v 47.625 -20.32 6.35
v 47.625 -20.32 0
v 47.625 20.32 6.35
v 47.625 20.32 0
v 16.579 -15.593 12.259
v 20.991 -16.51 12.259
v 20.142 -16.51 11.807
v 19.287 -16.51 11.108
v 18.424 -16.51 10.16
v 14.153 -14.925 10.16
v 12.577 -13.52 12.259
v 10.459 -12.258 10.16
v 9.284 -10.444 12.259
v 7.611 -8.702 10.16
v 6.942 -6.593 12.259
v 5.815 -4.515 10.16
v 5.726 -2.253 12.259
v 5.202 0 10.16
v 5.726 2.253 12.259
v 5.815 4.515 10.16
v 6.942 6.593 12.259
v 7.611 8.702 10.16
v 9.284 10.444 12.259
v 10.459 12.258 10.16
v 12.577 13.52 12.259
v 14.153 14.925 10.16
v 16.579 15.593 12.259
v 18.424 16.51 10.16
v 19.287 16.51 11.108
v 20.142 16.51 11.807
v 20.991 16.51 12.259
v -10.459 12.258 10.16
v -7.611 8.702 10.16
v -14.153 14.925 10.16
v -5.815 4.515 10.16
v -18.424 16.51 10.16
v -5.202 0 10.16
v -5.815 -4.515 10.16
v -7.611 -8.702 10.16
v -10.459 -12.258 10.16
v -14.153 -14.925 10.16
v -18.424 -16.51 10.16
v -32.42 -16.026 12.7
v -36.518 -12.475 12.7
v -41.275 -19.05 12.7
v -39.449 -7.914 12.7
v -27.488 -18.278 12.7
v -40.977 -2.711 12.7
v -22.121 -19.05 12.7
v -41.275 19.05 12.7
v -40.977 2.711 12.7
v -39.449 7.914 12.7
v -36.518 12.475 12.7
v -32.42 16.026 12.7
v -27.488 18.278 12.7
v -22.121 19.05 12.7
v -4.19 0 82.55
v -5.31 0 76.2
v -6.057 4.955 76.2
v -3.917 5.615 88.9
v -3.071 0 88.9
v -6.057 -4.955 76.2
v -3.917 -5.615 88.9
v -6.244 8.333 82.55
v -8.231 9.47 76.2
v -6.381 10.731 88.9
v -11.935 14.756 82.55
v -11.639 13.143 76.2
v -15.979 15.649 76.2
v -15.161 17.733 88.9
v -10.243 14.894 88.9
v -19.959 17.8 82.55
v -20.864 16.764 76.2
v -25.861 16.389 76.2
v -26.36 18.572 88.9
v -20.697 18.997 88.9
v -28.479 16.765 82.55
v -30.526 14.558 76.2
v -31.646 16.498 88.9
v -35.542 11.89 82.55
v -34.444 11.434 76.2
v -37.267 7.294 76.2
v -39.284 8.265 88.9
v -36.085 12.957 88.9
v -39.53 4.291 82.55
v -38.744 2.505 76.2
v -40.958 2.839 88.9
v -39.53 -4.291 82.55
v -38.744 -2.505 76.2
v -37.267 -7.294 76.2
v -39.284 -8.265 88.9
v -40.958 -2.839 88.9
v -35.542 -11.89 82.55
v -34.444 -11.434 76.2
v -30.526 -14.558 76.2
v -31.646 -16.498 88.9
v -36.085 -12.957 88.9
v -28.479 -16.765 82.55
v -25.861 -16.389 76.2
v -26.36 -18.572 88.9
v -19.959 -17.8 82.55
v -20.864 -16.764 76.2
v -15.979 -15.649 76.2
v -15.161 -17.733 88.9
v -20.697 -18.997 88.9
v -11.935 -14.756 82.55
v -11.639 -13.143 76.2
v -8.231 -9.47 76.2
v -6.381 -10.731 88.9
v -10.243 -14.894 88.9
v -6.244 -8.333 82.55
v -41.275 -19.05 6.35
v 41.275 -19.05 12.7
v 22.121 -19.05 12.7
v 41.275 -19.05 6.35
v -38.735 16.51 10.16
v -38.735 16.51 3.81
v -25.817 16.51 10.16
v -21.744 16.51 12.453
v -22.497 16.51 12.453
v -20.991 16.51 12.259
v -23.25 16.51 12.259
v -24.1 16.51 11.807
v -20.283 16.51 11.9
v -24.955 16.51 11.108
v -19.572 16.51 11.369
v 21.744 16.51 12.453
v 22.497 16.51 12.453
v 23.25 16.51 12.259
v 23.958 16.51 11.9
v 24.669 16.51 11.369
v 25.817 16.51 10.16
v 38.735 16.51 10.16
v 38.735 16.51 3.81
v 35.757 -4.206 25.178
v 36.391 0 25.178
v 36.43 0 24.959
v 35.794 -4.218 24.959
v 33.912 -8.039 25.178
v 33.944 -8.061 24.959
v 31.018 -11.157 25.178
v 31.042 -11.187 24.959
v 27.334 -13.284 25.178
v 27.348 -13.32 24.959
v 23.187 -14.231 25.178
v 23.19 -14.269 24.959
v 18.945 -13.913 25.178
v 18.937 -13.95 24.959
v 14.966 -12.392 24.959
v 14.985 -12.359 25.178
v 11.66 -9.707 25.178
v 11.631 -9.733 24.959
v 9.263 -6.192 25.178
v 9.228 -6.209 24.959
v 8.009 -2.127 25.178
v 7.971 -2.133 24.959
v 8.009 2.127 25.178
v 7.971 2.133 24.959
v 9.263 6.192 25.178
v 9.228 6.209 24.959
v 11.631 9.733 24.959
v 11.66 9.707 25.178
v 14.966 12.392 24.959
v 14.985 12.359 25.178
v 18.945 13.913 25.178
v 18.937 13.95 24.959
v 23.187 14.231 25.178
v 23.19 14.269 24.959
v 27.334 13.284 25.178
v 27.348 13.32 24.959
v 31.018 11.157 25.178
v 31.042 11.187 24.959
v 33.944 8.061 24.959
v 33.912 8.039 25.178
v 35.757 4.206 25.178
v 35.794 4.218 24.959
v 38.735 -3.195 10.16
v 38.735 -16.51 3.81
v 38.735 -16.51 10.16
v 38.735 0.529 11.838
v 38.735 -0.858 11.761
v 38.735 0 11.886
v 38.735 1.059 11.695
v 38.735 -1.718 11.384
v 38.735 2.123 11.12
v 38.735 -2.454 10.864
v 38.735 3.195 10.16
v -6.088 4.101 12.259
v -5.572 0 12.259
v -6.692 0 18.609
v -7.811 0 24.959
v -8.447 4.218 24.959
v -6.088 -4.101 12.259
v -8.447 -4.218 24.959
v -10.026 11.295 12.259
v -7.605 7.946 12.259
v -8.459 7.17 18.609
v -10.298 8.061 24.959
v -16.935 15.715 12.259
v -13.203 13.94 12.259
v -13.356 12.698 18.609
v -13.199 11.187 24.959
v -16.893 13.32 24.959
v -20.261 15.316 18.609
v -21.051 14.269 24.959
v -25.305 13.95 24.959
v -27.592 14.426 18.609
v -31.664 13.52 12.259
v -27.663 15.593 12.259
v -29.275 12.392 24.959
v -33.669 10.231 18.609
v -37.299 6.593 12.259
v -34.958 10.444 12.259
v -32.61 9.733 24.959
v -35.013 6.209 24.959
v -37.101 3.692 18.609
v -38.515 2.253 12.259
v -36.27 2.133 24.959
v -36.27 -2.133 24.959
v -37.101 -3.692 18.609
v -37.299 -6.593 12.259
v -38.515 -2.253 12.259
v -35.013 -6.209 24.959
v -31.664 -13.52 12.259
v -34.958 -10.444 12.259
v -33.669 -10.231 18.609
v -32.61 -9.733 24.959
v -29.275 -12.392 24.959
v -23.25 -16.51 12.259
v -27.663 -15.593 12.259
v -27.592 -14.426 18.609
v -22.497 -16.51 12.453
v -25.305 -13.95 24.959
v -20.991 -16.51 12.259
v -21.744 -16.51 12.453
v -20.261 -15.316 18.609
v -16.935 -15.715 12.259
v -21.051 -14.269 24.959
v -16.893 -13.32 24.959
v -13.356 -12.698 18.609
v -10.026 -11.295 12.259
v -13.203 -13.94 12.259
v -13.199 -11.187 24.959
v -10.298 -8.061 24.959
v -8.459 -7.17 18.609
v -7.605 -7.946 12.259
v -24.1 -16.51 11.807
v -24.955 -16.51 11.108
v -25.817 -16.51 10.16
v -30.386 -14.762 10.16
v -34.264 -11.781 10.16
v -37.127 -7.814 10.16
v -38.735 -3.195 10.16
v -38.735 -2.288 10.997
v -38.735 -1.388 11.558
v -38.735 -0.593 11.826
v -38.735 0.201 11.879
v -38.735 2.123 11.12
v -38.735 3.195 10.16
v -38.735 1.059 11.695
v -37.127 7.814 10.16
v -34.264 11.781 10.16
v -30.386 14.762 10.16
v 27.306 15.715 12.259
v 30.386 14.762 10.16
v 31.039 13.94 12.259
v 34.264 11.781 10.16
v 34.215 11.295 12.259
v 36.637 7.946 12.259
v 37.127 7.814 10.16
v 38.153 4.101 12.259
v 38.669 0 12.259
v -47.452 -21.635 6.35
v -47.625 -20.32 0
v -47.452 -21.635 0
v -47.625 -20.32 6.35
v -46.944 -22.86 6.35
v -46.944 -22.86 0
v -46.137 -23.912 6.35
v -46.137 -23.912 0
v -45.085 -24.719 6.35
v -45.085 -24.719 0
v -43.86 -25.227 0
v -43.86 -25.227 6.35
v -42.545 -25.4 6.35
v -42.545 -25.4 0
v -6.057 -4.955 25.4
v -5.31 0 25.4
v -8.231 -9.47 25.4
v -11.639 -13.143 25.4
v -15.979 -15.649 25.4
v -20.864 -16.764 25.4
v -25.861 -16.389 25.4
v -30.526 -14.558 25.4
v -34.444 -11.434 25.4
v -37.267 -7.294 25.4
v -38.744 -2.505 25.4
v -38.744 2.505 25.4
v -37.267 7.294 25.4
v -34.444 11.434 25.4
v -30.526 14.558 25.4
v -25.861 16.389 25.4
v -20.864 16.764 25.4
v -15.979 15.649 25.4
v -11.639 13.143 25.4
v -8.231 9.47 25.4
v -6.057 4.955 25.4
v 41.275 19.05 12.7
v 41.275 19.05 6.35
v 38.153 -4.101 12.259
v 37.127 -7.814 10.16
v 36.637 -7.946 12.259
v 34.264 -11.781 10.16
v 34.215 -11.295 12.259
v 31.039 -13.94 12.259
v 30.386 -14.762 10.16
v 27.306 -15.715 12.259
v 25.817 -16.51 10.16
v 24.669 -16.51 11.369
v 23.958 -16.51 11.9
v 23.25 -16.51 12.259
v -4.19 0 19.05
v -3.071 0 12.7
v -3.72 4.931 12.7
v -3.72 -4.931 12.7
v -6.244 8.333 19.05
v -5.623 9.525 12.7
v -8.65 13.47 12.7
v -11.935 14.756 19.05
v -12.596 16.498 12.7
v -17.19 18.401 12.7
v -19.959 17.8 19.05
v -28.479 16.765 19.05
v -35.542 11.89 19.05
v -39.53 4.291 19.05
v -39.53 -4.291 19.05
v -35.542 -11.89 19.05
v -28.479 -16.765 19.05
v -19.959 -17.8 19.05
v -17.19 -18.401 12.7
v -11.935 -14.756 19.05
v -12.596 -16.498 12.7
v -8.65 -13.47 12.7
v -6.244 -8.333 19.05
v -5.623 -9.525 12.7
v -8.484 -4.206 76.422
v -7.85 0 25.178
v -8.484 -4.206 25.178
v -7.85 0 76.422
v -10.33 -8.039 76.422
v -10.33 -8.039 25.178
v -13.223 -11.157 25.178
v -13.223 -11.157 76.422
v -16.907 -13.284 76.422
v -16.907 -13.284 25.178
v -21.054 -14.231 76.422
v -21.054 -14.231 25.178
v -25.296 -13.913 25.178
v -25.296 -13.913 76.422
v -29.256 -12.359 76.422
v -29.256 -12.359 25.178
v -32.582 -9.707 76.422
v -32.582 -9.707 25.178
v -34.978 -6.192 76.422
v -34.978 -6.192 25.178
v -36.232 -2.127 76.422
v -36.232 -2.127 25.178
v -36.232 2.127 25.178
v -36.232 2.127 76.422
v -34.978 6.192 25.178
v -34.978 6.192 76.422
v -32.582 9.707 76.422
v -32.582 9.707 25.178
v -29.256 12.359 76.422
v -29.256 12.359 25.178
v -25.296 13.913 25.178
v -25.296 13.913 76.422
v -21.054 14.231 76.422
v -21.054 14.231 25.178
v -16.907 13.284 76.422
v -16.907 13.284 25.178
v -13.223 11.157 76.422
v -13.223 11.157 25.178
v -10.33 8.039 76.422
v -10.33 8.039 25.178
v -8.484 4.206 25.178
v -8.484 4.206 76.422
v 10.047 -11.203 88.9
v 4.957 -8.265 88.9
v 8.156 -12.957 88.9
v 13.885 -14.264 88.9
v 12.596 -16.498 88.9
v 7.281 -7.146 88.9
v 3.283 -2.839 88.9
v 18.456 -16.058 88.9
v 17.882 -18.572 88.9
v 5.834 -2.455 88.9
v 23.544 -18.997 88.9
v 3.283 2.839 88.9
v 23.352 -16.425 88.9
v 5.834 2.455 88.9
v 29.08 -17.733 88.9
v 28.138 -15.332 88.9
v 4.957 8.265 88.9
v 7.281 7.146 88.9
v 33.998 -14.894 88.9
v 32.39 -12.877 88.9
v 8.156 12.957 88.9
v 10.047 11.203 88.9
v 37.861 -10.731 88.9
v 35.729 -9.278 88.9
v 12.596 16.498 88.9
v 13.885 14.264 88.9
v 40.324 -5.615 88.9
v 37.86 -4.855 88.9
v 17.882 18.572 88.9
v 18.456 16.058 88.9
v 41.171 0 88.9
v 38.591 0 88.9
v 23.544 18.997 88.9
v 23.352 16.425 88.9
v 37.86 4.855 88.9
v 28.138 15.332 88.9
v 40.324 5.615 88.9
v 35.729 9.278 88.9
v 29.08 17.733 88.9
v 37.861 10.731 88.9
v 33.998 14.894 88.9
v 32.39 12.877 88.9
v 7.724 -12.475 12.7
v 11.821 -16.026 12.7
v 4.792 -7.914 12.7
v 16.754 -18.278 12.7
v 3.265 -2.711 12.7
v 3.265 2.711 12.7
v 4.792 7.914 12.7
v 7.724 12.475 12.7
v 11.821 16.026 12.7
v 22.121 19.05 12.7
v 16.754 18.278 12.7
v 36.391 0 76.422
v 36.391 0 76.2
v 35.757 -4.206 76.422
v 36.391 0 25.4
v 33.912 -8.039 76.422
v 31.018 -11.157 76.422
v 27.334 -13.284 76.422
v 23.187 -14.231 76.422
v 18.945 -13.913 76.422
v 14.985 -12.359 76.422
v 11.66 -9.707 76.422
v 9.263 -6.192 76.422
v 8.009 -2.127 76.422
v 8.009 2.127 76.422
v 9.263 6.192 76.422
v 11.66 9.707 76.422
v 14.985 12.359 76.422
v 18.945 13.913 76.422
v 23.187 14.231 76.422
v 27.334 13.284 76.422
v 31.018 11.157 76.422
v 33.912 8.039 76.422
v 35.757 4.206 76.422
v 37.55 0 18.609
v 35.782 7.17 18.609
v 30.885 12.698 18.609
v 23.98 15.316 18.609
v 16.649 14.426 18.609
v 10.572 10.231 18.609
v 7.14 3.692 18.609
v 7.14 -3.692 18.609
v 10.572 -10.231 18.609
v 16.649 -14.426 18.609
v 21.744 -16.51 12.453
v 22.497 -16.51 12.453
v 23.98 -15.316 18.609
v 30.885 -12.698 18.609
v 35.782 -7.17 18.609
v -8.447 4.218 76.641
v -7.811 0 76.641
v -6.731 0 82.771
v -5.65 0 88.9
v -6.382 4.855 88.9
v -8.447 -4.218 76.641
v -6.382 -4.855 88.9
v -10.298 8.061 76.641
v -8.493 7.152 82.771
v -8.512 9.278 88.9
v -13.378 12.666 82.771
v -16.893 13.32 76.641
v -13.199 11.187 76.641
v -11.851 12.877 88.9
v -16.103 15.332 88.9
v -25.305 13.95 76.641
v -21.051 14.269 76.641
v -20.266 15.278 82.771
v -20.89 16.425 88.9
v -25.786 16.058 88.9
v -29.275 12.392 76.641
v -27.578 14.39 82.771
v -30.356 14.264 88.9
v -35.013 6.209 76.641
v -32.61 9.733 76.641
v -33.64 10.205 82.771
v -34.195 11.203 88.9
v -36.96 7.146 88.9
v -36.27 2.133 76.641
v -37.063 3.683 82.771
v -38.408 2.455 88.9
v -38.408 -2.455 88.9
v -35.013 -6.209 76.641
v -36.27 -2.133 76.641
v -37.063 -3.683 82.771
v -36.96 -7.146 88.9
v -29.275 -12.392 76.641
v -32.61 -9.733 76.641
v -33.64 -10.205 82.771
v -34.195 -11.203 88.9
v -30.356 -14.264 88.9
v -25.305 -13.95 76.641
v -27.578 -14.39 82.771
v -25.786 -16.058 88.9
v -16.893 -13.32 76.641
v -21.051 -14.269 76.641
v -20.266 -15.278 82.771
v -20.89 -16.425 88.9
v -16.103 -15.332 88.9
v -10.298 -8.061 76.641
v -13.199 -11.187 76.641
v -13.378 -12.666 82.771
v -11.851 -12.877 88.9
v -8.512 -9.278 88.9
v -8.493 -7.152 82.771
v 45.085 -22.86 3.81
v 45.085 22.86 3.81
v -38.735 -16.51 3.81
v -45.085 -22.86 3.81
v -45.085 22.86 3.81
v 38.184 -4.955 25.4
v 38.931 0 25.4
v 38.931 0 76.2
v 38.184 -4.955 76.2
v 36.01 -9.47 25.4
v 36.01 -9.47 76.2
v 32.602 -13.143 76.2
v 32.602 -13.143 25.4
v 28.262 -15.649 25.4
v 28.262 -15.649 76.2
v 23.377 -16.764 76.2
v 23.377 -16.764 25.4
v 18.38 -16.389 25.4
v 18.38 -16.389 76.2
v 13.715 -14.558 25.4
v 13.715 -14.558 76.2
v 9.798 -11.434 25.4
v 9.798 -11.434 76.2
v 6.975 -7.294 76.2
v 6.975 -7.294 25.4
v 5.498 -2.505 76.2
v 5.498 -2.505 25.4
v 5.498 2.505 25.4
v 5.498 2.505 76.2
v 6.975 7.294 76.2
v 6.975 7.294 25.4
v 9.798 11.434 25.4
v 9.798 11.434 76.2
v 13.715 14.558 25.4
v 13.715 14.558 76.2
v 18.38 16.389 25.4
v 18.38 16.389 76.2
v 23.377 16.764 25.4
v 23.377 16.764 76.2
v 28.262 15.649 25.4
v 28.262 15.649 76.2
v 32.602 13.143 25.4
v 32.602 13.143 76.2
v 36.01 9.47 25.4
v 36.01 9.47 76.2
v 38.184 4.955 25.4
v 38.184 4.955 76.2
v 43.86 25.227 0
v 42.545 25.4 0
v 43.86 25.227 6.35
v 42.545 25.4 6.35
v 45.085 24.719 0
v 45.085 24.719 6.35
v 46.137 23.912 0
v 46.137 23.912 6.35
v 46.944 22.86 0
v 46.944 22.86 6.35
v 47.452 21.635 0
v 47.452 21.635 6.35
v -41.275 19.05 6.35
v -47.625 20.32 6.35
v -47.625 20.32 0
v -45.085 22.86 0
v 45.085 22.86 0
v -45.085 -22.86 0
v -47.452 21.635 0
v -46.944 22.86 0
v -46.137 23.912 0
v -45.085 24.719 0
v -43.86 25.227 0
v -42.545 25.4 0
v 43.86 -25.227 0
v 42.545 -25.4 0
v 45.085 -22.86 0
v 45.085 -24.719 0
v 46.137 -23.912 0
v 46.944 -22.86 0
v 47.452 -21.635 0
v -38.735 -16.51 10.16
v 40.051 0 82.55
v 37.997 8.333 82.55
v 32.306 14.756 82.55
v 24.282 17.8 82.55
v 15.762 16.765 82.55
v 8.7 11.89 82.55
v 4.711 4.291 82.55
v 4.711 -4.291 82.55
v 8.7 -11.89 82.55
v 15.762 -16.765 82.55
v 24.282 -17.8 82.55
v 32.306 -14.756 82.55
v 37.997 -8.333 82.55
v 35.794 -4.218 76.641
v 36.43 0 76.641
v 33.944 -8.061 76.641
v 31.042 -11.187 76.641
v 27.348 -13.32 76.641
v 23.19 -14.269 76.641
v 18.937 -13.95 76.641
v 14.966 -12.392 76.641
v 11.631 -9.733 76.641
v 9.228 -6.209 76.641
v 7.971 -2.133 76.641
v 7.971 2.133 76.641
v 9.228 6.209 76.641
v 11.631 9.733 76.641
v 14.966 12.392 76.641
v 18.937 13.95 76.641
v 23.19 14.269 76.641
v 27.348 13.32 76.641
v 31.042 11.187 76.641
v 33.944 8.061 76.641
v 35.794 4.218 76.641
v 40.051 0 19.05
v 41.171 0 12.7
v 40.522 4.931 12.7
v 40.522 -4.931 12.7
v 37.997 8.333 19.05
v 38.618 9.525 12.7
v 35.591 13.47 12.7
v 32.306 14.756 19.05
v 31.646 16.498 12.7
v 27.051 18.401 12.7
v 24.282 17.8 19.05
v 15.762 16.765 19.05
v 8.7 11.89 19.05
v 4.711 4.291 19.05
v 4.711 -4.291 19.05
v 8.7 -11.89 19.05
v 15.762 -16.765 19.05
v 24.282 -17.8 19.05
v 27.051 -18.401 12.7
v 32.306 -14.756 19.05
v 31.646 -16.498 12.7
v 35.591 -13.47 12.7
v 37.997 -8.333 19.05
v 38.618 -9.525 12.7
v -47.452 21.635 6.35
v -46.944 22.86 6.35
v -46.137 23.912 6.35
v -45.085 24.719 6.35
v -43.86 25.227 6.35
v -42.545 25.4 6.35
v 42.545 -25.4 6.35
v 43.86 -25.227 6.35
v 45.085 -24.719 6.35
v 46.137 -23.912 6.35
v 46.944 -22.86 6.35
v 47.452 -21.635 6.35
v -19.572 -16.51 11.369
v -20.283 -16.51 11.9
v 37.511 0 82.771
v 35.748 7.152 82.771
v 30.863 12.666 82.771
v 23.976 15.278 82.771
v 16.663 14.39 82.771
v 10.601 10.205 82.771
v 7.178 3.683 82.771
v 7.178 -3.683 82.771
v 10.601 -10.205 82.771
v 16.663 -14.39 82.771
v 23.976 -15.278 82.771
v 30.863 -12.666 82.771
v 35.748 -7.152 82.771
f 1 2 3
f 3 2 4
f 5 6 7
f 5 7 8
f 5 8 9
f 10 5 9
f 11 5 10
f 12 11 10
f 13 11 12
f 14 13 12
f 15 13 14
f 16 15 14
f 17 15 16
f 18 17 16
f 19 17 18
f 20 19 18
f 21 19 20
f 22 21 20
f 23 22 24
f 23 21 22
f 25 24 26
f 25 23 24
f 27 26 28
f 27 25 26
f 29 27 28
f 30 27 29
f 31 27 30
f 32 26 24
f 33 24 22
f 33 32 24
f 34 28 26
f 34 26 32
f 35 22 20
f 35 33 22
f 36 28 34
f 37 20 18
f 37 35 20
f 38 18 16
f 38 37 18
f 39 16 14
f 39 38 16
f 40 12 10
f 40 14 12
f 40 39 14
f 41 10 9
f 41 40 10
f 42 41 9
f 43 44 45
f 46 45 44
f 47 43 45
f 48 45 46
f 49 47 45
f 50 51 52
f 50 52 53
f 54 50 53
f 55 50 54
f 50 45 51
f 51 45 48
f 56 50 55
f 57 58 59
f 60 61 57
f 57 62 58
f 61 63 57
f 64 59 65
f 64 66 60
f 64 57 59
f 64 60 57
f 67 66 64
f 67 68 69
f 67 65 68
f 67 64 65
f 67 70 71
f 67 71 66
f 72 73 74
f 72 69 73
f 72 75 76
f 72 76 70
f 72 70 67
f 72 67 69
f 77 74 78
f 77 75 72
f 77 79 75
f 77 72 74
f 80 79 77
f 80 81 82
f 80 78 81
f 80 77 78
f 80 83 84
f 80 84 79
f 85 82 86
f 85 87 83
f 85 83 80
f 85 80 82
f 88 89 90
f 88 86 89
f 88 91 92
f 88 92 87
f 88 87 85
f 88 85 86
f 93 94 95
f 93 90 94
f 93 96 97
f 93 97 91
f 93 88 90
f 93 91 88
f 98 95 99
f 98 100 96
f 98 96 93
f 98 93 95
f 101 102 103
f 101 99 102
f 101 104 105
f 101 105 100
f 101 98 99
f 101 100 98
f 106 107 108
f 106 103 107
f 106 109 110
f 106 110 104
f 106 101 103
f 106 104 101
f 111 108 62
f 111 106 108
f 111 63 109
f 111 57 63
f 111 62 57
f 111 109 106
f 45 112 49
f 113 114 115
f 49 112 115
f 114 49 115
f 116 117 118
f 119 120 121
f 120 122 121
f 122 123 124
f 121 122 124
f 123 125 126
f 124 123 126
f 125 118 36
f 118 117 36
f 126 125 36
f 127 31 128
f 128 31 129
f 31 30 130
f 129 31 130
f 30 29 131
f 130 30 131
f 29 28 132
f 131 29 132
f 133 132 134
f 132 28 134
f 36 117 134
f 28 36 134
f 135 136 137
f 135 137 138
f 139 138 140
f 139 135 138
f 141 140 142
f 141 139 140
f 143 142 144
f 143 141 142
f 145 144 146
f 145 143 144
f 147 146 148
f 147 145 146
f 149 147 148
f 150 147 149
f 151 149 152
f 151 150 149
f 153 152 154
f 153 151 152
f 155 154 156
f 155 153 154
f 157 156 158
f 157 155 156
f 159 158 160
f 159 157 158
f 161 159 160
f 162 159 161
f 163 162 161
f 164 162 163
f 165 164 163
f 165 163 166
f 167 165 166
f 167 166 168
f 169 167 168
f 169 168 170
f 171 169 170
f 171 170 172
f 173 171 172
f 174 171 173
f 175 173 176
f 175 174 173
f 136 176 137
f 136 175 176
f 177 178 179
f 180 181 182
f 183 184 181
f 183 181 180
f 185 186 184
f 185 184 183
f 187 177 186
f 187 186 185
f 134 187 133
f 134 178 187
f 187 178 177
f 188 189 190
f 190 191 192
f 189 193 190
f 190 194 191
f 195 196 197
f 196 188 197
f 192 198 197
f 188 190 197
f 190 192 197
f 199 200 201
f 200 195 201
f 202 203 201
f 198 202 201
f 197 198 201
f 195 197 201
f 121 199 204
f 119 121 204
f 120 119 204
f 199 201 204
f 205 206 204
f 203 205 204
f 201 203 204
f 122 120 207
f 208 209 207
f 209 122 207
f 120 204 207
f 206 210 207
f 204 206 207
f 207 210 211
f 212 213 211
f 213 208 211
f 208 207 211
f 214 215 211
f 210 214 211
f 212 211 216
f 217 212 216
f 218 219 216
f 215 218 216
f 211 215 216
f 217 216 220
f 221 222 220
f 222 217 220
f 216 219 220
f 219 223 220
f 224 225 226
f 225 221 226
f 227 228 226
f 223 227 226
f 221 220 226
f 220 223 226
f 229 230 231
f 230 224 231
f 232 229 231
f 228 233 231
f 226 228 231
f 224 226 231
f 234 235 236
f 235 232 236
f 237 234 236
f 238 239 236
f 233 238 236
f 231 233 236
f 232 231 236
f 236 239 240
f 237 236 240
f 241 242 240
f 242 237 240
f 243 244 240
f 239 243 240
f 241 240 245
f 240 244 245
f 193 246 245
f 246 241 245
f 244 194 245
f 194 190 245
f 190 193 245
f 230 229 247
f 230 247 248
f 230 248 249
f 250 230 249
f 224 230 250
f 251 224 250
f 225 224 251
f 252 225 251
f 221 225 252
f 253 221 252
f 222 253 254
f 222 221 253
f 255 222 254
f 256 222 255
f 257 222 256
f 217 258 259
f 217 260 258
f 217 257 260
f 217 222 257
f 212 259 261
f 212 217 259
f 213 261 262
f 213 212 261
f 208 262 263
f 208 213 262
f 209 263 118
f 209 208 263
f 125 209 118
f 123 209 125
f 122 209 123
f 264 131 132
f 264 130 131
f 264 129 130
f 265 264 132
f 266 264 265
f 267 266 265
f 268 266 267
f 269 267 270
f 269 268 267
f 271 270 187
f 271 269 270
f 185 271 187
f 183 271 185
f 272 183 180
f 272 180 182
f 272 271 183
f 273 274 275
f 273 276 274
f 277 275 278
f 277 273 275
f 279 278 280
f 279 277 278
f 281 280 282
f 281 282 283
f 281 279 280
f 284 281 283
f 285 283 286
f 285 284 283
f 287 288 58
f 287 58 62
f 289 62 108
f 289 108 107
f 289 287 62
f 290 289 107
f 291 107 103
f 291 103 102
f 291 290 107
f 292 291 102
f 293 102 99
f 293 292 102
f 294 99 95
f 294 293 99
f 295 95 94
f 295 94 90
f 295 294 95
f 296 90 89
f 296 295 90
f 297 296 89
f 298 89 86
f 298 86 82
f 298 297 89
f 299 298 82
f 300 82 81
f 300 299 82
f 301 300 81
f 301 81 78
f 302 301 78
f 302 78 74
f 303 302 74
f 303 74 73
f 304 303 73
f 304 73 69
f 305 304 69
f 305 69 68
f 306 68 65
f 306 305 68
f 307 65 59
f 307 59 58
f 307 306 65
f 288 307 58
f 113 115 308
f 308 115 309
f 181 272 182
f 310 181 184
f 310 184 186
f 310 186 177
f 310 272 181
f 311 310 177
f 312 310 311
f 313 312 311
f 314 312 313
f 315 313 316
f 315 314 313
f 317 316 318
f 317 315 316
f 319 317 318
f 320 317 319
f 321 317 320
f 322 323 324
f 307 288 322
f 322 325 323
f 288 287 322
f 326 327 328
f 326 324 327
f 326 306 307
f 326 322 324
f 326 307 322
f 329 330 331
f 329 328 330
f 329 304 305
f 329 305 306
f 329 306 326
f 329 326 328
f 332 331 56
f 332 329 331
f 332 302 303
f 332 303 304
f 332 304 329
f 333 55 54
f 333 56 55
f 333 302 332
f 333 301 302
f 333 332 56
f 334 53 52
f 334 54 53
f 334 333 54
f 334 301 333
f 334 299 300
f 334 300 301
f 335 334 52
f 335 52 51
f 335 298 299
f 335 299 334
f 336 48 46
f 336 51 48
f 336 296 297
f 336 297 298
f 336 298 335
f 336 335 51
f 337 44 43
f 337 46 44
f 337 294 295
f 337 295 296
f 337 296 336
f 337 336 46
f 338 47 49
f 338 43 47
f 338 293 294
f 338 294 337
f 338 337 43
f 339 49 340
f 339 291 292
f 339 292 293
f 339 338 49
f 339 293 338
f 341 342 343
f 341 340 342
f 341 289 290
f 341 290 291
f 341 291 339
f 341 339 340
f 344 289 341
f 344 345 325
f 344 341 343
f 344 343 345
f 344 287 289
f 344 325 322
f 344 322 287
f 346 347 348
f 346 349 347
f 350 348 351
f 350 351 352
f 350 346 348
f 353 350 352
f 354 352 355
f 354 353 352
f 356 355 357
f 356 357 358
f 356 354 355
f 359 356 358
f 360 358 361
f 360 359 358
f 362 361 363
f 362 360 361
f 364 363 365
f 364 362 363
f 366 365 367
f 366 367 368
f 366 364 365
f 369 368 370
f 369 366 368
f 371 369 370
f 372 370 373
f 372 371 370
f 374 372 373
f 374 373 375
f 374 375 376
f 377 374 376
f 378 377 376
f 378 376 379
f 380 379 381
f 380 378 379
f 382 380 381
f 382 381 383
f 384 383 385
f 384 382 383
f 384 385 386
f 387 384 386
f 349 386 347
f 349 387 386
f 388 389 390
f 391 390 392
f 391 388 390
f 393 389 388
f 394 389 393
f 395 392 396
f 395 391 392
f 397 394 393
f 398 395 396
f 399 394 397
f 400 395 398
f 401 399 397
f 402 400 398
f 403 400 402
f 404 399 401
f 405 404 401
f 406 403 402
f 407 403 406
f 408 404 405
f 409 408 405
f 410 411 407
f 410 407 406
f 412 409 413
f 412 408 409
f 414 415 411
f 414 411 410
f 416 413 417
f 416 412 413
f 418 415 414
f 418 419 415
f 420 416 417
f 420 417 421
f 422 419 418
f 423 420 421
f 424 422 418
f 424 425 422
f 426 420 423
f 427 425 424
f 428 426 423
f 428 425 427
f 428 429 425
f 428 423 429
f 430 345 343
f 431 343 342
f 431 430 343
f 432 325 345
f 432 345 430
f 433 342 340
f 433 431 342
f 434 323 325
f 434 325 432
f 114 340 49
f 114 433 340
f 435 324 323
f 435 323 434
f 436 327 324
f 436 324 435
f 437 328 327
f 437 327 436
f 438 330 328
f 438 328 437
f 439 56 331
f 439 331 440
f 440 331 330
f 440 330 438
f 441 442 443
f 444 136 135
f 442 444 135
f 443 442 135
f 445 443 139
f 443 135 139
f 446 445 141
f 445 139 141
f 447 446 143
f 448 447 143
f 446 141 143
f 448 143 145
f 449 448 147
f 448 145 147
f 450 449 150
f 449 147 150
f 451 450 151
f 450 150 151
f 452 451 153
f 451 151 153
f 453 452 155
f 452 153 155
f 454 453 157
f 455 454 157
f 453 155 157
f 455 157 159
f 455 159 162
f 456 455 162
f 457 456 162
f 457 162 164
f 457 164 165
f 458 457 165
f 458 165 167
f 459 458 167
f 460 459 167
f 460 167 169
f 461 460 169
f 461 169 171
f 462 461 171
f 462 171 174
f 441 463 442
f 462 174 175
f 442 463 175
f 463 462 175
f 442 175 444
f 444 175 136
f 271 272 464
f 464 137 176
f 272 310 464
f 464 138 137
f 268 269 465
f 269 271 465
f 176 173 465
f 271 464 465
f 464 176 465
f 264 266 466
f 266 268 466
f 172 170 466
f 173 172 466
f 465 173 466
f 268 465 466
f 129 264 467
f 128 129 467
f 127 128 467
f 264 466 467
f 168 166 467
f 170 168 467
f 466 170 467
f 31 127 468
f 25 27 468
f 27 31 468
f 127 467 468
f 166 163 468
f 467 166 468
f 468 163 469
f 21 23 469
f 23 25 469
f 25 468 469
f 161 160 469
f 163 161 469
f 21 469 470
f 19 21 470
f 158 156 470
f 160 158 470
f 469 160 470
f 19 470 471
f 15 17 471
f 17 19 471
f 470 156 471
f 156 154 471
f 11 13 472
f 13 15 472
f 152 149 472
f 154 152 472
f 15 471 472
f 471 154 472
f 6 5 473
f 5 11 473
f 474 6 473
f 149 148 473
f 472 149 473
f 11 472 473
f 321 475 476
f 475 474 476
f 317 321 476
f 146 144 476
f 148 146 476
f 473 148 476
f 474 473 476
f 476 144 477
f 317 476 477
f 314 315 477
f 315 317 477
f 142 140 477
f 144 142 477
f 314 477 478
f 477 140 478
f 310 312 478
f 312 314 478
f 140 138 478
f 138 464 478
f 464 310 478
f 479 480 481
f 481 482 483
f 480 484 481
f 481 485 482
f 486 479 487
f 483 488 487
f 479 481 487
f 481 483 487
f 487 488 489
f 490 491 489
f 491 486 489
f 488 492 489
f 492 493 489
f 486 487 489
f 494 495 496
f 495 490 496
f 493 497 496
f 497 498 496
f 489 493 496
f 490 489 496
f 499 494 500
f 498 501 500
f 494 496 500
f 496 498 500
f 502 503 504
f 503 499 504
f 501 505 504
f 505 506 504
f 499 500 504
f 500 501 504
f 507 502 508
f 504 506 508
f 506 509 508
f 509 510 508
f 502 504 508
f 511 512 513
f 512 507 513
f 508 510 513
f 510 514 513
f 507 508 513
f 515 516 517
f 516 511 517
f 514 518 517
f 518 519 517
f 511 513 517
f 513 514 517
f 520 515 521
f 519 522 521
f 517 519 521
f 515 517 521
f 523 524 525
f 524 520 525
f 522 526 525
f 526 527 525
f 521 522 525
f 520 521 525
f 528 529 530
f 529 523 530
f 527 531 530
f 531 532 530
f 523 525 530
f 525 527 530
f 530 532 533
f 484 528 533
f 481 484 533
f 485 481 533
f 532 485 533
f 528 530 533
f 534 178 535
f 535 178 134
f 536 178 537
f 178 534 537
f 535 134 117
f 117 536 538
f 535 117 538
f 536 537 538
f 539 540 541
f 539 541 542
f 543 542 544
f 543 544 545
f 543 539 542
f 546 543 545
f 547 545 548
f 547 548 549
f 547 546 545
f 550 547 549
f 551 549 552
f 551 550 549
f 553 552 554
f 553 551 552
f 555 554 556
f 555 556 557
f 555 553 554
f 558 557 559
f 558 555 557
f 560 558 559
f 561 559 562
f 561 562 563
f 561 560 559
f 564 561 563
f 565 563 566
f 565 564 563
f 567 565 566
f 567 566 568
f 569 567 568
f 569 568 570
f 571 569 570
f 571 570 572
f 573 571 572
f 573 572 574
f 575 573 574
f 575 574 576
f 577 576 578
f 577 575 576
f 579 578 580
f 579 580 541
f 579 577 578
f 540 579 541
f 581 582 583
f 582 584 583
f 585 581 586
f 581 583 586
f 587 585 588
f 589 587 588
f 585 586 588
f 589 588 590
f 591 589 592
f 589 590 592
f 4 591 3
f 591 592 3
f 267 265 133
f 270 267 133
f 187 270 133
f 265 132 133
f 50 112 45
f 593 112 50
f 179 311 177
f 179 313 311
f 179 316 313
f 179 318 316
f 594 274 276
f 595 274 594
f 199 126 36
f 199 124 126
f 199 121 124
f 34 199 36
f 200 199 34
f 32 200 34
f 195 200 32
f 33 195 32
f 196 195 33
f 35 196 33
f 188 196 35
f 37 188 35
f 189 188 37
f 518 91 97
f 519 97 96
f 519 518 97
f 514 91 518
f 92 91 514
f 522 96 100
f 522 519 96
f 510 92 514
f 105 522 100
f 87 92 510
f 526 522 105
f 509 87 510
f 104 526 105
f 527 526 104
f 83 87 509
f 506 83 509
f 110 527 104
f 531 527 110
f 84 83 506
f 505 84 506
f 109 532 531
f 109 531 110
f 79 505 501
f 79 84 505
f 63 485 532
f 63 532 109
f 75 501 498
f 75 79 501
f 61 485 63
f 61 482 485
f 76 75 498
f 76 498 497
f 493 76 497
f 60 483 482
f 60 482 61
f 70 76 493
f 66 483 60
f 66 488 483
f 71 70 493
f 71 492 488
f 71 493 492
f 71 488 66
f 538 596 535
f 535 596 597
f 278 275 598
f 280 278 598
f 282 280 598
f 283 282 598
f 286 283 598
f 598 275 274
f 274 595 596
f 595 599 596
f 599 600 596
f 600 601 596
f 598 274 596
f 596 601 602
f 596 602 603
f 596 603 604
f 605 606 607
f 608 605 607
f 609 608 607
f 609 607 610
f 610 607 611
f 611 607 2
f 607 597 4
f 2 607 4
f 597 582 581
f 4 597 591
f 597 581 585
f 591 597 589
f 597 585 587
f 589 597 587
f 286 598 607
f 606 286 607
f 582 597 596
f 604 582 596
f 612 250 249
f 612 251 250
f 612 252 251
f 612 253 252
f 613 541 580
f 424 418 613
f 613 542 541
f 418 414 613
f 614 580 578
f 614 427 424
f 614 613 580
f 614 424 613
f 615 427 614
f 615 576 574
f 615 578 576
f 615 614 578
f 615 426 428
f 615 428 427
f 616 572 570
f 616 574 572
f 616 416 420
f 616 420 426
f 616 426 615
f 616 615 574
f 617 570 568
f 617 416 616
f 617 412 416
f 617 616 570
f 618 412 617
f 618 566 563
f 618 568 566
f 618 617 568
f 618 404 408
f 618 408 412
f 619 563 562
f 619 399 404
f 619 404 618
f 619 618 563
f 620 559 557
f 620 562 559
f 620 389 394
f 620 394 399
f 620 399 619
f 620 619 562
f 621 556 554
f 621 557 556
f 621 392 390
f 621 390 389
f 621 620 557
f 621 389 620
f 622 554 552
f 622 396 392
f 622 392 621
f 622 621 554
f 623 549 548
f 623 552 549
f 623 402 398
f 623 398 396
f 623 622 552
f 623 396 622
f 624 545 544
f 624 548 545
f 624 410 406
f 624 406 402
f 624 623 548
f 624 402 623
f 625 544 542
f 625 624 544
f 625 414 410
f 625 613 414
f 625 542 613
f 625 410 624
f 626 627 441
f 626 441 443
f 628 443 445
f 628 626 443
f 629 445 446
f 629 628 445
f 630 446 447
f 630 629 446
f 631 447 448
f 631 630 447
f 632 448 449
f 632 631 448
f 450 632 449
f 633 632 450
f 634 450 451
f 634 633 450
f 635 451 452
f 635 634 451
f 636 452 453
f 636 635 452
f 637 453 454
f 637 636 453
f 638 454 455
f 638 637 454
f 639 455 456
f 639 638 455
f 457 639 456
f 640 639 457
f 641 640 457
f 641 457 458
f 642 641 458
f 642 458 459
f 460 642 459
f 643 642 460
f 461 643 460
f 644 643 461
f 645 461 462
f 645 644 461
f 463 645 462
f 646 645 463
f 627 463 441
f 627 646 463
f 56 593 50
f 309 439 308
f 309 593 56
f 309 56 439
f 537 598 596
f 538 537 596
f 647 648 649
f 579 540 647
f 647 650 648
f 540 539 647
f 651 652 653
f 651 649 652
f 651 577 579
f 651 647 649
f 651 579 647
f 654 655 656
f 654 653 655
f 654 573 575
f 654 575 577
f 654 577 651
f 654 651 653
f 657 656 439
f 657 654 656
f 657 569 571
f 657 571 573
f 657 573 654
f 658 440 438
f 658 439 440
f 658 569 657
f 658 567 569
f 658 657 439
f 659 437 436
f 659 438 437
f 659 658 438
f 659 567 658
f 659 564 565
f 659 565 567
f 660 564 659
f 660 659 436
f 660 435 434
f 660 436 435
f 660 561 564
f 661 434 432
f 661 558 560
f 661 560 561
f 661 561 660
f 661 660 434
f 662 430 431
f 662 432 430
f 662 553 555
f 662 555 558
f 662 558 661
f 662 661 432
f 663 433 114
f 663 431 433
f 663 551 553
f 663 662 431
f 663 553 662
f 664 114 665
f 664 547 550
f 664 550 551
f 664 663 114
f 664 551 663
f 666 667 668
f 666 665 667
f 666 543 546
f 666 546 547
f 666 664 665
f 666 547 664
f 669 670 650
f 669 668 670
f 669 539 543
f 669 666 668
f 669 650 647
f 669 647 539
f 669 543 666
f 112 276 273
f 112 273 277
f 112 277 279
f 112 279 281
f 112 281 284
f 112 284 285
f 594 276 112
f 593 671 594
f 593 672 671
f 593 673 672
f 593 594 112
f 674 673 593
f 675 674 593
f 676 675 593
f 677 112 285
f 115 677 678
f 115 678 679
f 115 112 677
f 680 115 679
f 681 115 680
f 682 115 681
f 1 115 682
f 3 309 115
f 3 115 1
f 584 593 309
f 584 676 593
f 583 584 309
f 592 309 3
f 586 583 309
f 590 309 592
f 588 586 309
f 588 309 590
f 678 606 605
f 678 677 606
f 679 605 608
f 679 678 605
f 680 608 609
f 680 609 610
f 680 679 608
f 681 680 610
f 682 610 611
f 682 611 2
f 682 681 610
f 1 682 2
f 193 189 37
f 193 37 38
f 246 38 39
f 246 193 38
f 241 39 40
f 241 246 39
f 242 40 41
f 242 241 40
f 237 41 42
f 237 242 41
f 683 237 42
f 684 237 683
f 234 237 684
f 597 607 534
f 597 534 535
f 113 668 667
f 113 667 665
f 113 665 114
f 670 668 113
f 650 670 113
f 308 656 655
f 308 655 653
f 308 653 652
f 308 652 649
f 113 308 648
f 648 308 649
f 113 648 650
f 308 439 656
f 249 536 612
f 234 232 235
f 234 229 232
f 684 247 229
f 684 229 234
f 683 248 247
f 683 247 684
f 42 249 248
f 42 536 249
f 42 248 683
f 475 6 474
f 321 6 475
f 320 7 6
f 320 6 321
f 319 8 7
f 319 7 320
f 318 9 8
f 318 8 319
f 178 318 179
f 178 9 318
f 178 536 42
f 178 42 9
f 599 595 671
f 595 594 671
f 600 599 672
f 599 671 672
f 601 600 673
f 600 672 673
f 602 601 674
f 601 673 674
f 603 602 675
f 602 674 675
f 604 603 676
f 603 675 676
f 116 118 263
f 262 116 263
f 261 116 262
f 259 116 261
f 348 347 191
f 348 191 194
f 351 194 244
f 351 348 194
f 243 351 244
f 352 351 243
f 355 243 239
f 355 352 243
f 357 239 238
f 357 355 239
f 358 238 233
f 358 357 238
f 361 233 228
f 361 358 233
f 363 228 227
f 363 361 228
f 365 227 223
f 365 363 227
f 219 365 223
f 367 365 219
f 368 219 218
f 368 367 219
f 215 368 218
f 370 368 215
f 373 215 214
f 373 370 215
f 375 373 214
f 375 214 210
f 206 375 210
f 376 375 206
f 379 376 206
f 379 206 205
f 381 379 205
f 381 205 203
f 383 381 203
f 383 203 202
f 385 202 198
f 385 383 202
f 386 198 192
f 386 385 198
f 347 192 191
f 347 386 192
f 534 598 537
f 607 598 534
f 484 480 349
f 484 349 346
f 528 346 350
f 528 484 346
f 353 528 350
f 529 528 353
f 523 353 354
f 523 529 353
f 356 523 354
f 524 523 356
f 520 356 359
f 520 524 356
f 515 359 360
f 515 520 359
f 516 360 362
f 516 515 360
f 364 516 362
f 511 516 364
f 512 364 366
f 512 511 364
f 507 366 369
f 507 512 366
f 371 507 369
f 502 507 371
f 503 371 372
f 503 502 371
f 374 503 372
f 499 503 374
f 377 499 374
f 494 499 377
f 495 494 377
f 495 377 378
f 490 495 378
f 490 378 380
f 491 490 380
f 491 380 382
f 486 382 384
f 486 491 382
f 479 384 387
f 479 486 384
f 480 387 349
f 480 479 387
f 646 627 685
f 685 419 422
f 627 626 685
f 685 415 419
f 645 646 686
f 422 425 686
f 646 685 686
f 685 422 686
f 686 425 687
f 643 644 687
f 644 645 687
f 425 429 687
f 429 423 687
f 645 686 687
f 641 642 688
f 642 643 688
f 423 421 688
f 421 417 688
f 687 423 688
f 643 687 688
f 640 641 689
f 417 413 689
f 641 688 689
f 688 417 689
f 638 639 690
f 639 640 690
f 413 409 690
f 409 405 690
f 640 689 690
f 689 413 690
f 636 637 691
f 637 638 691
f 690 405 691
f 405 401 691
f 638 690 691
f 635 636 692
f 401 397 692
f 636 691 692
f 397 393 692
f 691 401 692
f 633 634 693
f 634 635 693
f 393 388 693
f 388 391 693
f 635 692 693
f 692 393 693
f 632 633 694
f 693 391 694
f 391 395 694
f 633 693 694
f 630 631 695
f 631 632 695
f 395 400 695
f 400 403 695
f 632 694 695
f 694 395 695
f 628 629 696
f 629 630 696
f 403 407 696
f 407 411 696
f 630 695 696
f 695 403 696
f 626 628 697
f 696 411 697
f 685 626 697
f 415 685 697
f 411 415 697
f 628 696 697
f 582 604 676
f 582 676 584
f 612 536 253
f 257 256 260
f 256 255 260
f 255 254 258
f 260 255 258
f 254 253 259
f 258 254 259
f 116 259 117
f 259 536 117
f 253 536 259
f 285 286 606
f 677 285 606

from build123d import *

# Parameters (mm, degrees)
F0_W         = 95.25
F0_H         = 50.8
F1_DEPTH     = 6.35
F2_W         = 82.55
F2_H         = 38.1
F3_DEPTH     = 6.35
F4_R         = 19.05
F5_DEPTH     = 12.7
F5_TAPER     = 10
F6_DEPTH     = 50.8
F6_FACE_R    = 16.810647345
F7_DEPTH     = 12.7
F7_TAPER     = -10
F8_T         = 2.54
F8_T3_DEPTH  = 87.63
F8_T5_DEPTH  = 43.18
F8_T8_ANGLE  = 180.0000001354
F8_T10_ANGLE = 90.000000001
F8_T12_ANGLE = 89.9999998666
F8_T14_ANGLE = 180.000000001
F8_T16_ANGLE = 90.000000001
F8_T18_ANGLE = 90.000000001
F9_R         = 5.08


# Not quite as in the source:
# - a shell that OpenCascade refuses in one call is made with other operations: the cavity is built on its own and cut out


with BuildPart() as f1:
    # F0 (on Top) → F1 (new body)
    with BuildSketch(Plane.XY):
        Rectangle(F0_W, F0_H)
    extrude(amount=F1_DEPTH)

    # F2 (on face) → F3 (join)
    with BuildSketch(Plane.XY.offset(6.35)):
        Rectangle(F2_W, F2_H)
    extrude(amount=F3_DEPTH)

    # F4 (on face) → F5 (join)
    with BuildSketch(Plane.XY.offset(12.7)):
        with Locations((-22.1206657588, 0)):
            Circle(F4_R)
        with Locations((22.1206657588, 0)):
            Circle(F4_R)
    extrude(amount=F5_DEPTH, taper=F5_TAPER)

    # F6 (add): faces of the model
    f6_faces = [f1.faces().sort_by_distance(p)[0] for p in [
        (-22.1206657588, 0, 25.4),
        (22.1206657588, 0, 25.4),
    ]]
    extrude(f6_faces, amount=F6_DEPTH)

    # F6_face (on face) → F7 (join)
    with BuildSketch(Plane(origin=(22.1206657588, 0, 76.2), x_dir=(1, 0, 0), z_dir=(0, 0, 1))):
        Circle(F6_FACE_R)
        with Locations((-44.2413315177, 0)):
            Circle(F6_FACE_R)
    extrude(amount=F7_DEPTH, taper=F7_TAPER)

    # F8: shell of thickness 2.54, made by hand


with BuildPart() as f8_core1:
    # F8_t2: copy of F1
    add(f1.part)

    # the walls: a layer under each face that stays
    f8_faces = [f8_core1.faces().sort_by_distance(p)[0] for p in [
        (0, -25.4, 3.175),
        (-47.625, 0, 3.175),
        (47.625, 0, 3.175),
        (-40.8214285714, -21.7714285714, 6.35),
        (0, 25.4, 3.175),
        (0, -19.05, 9.525),
        (41.275, 0, 9.525),
        (0, 19.05, 9.525),
        (-41.275, 0, 9.525),
        (-38.0826109524, -12.7, 12.7),
        (0, 0, 12.7),
        (38.0826109598, -12.7, 12.7),
        (-40.0509894313, 0, 19.05),
        (4.1903420863, 0, 19.05),
        (-38.9313131039, 0, 50.8),
        (5.3100184138, 0, 50.8),
        (-40.0509894313, 0, 82.55),
        (4.1903420863, 0, 82.55),
    ]]
    thicken(f8_faces, amount=-F8_T, mode=Mode.SUBTRACT)

    # F8_s4 → F8_t3 (cut)
    with BuildSketch(Plane.YZ.offset(-43.815)):
        Polygon((-19.0754, 6.3754), (-19.05, 3.81), (-16.51, 3.81), (-16.51, 6.35), align=None)
        Polygon((19.0754, 6.3754), (19.05, 3.81), (16.51, 3.81), (16.51, 6.35), align=None)
    extrude(amount=F8_T3_DEPTH, mode=Mode.SUBTRACT)

    # F8_s6 → F8_t5 (cut)
    with BuildSketch(Plane.XZ.offset(-21.59)):
        Polygon((41.3004, 6.3754), (41.275, 3.81), (38.735, 3.81), (38.735, 6.35), align=None)
        Polygon((-41.3004, 6.3754), (-41.275, 3.81), (-38.735, 3.81), (-38.735, 6.35), align=None)
    extrude(amount=F8_T5_DEPTH, mode=Mode.SUBTRACT)

    # F8_s7 → F8_t8 (revolve, cut)
    with BuildSketch(Plane.YZ.offset(-22.1206657588)):
        Polygon((-19.0750141169, 12.7298106637), (-19.05, 10.16), (-16.9186869368, 10.16), (-16.5485883073, 12.2589336287), align=None)
    revolve(axis=Axis((-22.1206657588, 0, 12.7), (0, 0, -1)), revolution_arc=F8_T8_ANGLE, mode=Mode.SUBTRACT)

    # F8_s9 → F8_t10 (revolve, cut)
    with BuildSketch(Plane.XZ):
        Polygon((-3.0456516419, 12.7298106637), (-3.0706657588, 10.16), (-5.201978822, 10.16), (-5.5720774515, 12.2589336287), align=None)
    revolve(axis=Axis((-22.1206657588, 0, 12.7), (0, 0, -1)), revolution_arc=F8_T10_ANGLE, mode=Mode.SUBTRACT)

    # F8_s11 → F8_t12 (revolve, cut)
    with BuildSketch(Plane.YZ.offset(-22.1206657588)):
        Polygon((19.0750141169, 12.7298106637), (19.05, 10.16), (16.9186869368, 10.16), (16.5485883073, 12.2589336287), align=None)
    revolve(axis=Axis((-22.1206657588, 0, 12.7), (0, 0, -1)), revolution_arc=F8_T12_ANGLE, mode=Mode.SUBTRACT)

    # F8_s13 → F8_t14 (revolve, cut)
    with BuildSketch(Plane.YZ.offset(22.1206657588)):
        Polygon((-19.0750141169, 12.7298106637), (-19.05, 10.16), (-16.9186869368, 10.16), (-16.5485883073, 12.2589336287), align=None)
    revolve(axis=Axis((22.1206657588, 0, 12.7), (0, 0, -1)), revolution_arc=F8_T14_ANGLE, mode=Mode.SUBTRACT)

    # F8_s15 → F8_t16 (revolve, cut)
    with BuildSketch(Plane.XZ):
        Polygon((41.1956798758, 12.7298106637), (41.1706657588, 10.16), (39.0393526957, 10.16), (38.6692540662, 12.2589336287), align=None)
    revolve(axis=Axis((22.1206657588, 0, 12.7), (0, 0, -1)), revolution_arc=F8_T16_ANGLE, mode=Mode.SUBTRACT)

    # F8_s17 → F8_t18 (revolve, cut)
    with BuildSketch(Plane.YZ.offset(22.1206657588)):
        Polygon((19.0750141169, 12.7298106637), (19.05, 10.16), (16.9186869368, 10.16), (16.5485883073, 12.2589336287), align=None)
    revolve(axis=Axis((22.1206657588, 0, 12.7), (0, 0, -1)), revolution_arc=F8_T18_ANGLE, mode=Mode.SUBTRACT)

    # F8_s19 → F8_t20 (revolve, cut)
    with BuildSketch(Plane.XZ):
        Polygon((-5.2596042969, 25.4044106637), (-7.8114301065, 24.9589336287), (-7.8500184138, 25.1777787946), (-7.8500184138, 25.4), align=None)
    revolve(axis=Axis((-22.1206657588, 0, 25.4), (0, 0, -1)), mode=Mode.SUBTRACT)

    # F8_s21 → F8_t22 (revolve, cut)
    with BuildSketch(Plane.XZ):
        Polygon((38.9817272208, 25.4044106637), (36.4299014112, 24.9589336287), (36.3913131039, 25.1777787946), (36.3913131039, 25.4), align=None)
    revolve(axis=Axis((22.1206657588, 0, 25.4), (0, 0, -1)), mode=Mode.SUBTRACT)

    # F8_s23 → F8_t24 (revolve, cut)
    with BuildSketch(Plane.XZ):
        Polygon((-5.2596042969, 76.1955893363), (-7.8500184138, 76.2), (-7.8500184138, 76.4222212054), (-7.8114301065, 76.6410663713), align=None)
    revolve(axis=Axis((-22.1206657588, 0, 76.2), (0, 0, -1)), mode=Mode.SUBTRACT)

    # F8_s25 → F8_t26 (revolve, cut)
    with BuildSketch(Plane.XZ):
        Polygon((38.9817272208, 76.1955893363), (36.3913131039, 76.2), (36.3913131039, 76.4222212054), (36.4299014112, 76.6410663713), align=None)
    revolve(axis=Axis((22.1206657588, 0, 76.2), (0, 0, -1)), mode=Mode.SUBTRACT)


with BuildPart() as f1_1:
    add(f1.part)

    # what is left inside the walls is the cavity
    f8_cavity = [f8_core1.part.solids().sort_by_distance(p)[0] for p in [
        (-36.365913, 0, 59.266667),
    ]]
    add(f8_cavity, mode=Mode.SUBTRACT)

    # F9
    f9_edges = [f1_1.edges().sort_by_distance(p)[0] for p in [
        (-47.625, -25.4, 3.175),
        (47.625, -25.4, 3.175),
        (47.625, 25.4, 3.175),
        (-47.625, 25.4, 3.175),
    ]]
    fillet(f9_edges, radius=F9_R)


solid = f1_1.part
